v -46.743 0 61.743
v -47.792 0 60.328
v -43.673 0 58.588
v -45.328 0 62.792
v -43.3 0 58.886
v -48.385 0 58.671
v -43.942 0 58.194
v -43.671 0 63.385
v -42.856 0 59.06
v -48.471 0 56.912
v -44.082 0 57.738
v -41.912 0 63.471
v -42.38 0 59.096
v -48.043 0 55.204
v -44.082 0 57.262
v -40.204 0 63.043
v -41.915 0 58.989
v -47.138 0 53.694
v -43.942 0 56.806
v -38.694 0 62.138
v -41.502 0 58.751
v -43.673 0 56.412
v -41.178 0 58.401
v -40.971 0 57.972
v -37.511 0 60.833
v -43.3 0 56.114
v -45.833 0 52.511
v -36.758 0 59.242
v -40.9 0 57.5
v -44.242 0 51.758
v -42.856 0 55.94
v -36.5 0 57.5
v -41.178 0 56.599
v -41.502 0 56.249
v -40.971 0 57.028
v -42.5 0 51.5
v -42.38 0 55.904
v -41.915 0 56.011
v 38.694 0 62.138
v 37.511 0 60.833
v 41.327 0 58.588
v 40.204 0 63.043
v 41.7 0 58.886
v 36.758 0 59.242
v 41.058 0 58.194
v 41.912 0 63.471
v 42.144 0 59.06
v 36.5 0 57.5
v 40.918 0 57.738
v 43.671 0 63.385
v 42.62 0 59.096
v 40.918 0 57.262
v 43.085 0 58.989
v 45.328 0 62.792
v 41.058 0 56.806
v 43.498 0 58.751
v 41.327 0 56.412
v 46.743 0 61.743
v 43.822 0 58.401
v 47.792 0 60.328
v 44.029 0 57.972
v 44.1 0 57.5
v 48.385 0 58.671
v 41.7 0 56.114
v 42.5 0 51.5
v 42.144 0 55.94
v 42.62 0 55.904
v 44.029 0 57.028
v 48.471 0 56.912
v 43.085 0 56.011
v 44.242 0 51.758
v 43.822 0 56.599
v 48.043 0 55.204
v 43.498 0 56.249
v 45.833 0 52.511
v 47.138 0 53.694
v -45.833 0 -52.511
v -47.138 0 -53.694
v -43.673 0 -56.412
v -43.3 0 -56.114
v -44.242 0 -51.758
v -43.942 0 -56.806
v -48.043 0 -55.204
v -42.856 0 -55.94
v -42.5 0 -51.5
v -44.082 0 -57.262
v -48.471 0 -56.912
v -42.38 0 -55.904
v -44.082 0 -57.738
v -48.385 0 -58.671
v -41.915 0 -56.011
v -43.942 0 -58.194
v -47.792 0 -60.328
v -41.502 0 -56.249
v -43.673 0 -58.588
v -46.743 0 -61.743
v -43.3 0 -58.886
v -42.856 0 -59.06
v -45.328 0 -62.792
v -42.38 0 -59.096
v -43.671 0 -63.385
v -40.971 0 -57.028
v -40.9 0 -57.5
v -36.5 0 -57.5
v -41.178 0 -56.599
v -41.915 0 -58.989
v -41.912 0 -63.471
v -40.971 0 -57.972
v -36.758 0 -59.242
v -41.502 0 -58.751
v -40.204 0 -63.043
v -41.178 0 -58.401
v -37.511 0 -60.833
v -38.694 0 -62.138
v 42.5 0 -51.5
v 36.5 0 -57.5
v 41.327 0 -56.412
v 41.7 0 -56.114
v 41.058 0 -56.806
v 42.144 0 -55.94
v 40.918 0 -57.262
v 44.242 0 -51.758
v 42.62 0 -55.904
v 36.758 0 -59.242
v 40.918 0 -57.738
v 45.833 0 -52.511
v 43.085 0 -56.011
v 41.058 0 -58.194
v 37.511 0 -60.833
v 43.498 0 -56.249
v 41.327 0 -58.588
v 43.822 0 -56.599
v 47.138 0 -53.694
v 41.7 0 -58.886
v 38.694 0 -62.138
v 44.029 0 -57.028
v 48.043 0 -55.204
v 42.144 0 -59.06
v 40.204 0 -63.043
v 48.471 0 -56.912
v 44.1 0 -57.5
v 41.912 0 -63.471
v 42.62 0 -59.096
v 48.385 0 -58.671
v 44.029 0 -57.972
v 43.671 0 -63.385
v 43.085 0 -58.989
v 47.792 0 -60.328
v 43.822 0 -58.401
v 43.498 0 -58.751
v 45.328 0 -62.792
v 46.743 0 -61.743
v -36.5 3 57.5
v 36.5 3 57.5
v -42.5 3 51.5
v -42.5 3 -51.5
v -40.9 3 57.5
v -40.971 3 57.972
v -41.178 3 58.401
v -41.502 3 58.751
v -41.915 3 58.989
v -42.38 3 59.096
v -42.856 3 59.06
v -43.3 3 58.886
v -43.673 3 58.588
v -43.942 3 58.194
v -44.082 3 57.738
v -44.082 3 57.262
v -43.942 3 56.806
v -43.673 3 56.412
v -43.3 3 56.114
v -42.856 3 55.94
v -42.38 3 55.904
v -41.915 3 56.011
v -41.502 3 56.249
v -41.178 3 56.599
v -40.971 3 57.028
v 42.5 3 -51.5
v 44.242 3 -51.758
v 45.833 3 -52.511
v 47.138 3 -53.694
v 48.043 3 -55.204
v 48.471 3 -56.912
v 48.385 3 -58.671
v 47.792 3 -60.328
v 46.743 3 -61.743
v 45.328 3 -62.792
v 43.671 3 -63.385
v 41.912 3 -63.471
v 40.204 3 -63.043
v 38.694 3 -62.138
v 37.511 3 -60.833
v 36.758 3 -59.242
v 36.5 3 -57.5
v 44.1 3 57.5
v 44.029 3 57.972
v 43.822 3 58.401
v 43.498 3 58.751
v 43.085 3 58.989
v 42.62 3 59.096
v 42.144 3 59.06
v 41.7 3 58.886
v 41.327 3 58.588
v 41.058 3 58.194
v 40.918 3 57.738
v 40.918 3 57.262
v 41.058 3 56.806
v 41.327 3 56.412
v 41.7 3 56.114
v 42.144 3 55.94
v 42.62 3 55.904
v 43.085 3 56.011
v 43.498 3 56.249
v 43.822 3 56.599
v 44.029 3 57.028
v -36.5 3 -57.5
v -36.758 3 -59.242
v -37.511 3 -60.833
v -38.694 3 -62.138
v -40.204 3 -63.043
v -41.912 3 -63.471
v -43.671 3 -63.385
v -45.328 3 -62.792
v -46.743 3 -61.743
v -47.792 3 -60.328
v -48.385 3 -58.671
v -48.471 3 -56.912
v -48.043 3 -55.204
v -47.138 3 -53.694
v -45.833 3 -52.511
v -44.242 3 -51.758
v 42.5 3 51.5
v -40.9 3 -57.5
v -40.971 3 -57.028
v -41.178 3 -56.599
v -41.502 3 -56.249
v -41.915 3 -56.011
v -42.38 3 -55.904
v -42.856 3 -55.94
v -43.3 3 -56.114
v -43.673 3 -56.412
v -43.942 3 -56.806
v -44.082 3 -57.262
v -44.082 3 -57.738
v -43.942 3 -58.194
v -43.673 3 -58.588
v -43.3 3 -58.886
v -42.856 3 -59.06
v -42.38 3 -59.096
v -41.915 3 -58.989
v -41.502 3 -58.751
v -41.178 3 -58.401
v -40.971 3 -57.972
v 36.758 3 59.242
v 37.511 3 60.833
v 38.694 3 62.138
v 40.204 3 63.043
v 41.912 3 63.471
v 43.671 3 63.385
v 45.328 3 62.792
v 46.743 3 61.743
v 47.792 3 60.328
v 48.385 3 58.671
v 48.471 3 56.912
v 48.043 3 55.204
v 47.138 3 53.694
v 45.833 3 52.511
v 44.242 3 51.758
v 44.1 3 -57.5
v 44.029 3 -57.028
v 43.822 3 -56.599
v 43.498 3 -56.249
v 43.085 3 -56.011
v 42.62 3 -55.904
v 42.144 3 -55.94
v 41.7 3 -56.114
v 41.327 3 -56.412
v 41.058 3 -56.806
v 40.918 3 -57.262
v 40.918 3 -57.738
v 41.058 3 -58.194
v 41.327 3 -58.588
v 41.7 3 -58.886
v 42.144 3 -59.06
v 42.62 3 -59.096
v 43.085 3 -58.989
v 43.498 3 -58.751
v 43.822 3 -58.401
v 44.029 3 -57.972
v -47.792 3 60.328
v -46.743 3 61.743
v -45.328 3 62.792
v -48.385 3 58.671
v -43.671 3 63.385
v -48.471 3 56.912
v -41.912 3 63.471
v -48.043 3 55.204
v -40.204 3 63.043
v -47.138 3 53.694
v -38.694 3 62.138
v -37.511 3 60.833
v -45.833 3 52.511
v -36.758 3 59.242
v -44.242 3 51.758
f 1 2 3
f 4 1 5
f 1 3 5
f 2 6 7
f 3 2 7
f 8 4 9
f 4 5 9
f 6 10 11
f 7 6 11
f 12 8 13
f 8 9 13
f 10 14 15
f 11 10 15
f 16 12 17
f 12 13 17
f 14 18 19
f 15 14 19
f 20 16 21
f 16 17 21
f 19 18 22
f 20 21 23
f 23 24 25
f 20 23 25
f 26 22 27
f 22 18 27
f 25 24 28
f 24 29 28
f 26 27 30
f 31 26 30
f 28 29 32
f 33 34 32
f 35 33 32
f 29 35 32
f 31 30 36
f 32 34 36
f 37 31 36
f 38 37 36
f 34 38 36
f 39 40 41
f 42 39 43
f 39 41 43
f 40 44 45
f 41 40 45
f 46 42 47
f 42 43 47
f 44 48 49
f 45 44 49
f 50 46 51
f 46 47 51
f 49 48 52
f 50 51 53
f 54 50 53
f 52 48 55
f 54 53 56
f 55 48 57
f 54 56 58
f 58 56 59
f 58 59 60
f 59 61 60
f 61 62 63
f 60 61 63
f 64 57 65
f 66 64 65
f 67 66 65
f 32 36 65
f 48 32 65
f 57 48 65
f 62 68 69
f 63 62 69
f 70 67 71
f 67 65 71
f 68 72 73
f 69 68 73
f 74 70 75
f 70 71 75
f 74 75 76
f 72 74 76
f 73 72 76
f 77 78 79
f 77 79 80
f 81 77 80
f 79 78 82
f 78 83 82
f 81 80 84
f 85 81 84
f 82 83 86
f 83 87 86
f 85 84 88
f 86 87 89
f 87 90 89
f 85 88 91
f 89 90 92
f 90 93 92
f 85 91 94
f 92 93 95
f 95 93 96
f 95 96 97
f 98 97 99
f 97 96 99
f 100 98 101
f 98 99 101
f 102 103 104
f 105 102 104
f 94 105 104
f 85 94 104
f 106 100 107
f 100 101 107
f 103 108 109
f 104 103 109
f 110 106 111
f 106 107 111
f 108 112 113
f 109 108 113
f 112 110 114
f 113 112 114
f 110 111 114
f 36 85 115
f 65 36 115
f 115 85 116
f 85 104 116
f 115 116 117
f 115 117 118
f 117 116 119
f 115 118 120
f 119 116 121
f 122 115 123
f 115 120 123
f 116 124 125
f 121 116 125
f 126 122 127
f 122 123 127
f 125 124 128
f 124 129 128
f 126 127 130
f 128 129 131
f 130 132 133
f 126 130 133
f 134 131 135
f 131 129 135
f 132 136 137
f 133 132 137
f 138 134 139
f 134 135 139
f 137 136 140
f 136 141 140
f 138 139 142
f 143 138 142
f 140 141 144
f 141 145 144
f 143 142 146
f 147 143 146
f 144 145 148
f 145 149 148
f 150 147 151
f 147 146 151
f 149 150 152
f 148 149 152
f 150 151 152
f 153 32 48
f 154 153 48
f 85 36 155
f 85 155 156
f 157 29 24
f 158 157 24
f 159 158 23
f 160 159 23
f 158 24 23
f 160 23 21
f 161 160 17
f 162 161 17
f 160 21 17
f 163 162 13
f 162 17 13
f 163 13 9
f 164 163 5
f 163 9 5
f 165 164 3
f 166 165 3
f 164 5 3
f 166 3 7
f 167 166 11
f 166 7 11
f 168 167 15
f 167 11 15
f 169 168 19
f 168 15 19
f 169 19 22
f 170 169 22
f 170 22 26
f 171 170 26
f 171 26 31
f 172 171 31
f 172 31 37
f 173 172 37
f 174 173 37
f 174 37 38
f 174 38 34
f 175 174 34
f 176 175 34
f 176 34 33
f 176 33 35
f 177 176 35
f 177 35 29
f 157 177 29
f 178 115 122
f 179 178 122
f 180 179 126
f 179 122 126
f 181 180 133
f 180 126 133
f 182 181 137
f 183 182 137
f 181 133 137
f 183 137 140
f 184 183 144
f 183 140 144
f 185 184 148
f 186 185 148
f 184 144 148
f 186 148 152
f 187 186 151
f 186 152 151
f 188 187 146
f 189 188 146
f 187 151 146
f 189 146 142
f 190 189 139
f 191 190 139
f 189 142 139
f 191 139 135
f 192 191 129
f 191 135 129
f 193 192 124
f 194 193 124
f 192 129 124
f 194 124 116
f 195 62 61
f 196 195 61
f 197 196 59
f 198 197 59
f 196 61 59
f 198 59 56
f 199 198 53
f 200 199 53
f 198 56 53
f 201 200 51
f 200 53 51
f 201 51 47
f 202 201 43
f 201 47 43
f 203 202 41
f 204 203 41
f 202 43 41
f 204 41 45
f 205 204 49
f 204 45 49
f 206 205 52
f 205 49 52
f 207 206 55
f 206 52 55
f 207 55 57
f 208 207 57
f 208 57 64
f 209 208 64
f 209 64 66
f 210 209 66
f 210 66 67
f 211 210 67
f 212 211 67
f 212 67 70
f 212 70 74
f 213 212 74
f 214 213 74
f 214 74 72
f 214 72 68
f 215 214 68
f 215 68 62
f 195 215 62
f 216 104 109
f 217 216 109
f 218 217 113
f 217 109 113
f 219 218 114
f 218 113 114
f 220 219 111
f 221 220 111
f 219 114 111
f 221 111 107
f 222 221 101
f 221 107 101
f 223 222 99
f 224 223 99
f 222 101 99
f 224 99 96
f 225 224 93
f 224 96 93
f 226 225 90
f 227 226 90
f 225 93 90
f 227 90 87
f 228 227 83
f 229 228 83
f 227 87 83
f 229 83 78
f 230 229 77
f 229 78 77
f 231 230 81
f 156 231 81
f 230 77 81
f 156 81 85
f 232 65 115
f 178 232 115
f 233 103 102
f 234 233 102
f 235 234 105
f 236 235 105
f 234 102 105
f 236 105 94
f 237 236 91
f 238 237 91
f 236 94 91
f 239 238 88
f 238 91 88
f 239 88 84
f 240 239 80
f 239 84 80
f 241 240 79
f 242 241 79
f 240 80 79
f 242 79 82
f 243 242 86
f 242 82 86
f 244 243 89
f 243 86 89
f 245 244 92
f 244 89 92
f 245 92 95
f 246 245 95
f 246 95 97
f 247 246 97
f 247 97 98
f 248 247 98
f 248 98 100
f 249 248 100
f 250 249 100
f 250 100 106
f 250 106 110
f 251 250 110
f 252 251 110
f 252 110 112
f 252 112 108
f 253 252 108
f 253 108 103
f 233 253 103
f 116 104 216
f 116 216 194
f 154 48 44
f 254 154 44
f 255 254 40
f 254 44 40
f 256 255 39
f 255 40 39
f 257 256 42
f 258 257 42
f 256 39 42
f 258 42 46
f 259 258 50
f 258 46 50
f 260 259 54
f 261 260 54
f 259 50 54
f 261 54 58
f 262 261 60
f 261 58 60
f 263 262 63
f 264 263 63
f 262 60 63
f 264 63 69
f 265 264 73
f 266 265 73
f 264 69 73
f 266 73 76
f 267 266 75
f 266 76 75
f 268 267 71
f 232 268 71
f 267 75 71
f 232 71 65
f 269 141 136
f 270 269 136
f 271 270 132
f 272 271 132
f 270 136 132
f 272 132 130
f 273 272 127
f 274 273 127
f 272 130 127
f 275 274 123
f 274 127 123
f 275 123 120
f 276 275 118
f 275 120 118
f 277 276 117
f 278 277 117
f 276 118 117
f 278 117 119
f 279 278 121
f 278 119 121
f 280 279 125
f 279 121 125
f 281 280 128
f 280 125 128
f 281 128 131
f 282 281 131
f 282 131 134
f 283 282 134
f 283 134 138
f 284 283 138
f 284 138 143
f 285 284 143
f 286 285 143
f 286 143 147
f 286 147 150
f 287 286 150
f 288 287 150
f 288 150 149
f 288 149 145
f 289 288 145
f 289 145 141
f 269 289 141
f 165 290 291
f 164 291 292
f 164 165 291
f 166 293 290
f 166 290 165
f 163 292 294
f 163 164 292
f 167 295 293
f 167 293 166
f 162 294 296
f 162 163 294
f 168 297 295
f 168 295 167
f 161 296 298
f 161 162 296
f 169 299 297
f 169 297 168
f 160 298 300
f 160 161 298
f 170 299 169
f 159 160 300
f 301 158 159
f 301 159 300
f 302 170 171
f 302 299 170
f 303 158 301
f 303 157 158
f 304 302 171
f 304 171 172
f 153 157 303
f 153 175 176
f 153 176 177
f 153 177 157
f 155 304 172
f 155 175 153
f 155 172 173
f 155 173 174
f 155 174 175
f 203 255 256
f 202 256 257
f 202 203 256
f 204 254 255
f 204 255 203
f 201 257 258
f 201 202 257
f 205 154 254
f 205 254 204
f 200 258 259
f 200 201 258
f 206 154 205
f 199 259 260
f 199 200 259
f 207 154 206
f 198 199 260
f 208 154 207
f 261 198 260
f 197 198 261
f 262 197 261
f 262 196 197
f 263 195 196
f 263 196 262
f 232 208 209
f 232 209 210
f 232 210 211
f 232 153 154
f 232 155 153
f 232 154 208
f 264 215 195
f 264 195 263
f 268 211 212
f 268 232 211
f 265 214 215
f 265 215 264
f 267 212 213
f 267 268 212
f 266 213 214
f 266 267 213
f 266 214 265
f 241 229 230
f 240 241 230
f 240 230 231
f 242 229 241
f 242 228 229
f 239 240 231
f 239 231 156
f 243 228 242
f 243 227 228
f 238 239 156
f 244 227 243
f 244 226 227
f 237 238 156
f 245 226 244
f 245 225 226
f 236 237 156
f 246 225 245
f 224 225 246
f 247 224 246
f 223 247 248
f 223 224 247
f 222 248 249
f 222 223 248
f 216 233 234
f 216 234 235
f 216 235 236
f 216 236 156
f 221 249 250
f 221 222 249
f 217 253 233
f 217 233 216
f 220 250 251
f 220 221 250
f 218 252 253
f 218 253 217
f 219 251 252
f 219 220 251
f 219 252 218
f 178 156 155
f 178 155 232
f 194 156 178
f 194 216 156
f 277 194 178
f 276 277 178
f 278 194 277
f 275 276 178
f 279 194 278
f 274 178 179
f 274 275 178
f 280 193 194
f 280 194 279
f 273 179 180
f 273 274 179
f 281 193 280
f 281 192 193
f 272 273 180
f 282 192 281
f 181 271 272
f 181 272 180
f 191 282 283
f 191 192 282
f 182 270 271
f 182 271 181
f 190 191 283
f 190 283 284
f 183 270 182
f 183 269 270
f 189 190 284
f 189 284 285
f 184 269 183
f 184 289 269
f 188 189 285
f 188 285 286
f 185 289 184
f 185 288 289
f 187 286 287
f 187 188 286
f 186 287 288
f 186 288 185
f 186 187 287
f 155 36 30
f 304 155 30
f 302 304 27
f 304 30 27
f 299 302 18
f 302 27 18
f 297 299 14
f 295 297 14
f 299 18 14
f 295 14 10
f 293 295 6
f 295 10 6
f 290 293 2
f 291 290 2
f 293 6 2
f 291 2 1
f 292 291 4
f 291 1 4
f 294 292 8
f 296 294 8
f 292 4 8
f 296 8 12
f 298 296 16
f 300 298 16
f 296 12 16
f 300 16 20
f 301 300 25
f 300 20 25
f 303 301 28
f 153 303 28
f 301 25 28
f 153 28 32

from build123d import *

# Parameters (mm, degrees)
SKETCH1_W           = 85
SKETCH1_H           = 115
BOSS_EXTRUDE1_DEPTH = 3
SKETCH2_R           = 1.6
CUT_EXTRUDE1_DEPTH  = 40


with BuildPart() as part:
    # Sketch1 → Boss-Extrude1 (new body)
    with BuildSketch(Plane(origin=(0, 0, 0), x_dir=(1, 0, 0), z_dir=(0, 1, 0))):
        Rectangle(SKETCH1_W, SKETCH1_H)
        with BuildLine():
            Line((-36.5, -57.5), (-42.5, -57.5))
            Line((-42.5, -57.5), (-42.5, -51.5))
            ThreePointArc((-42.5, -51.5), (-46.742640687, -61.742640687), (-36.5, -57.5))
        make_face()
        with BuildLine():
            Line((42.5, -57.5), (36.5, -57.5))
            ThreePointArc((36.5, -57.5), (46.742640687, -61.742640687), (42.5, -51.5))
            Line((42.5, -51.5), (42.5, -57.5))
        make_face()
        with BuildLine():
            Line((42.5, 57.5), (42.5, 51.5))
            ThreePointArc((42.5, 51.5), (46.742640687, 61.742640687), (36.5, 57.5))
            Line((36.5, 57.5), (42.5, 57.5))
        make_face()
        with BuildLine():
            ThreePointArc((-36.5, 57.5), (-46.742640687, 61.742640687), (-42.5, 51.5))
            Line((-42.5, 51.5), (-42.5, 57.5))
            Line((-42.5, 57.5), (-36.5, 57.5))
        make_face()
    extrude(amount=BOSS_EXTRUDE1_DEPTH)

    # Sketch2 → Cut-Extrude1 (cut)
    with BuildSketch(Plane.XZ):
        with Locations((-42.5, 57.5)):
            Circle(SKETCH2_R)
        with Locations((42.5, 57.5)):
            Circle(SKETCH2_R)
        with Locations((42.5, -57.5)):
            Circle(SKETCH2_R)
        with Locations((-42.5, -57.5)):
            Circle(SKETCH2_R)
    extrude(amount=-CUT_EXTRUDE1_DEPTH, mode=Mode.SUBTRACT)


solid = part.part
